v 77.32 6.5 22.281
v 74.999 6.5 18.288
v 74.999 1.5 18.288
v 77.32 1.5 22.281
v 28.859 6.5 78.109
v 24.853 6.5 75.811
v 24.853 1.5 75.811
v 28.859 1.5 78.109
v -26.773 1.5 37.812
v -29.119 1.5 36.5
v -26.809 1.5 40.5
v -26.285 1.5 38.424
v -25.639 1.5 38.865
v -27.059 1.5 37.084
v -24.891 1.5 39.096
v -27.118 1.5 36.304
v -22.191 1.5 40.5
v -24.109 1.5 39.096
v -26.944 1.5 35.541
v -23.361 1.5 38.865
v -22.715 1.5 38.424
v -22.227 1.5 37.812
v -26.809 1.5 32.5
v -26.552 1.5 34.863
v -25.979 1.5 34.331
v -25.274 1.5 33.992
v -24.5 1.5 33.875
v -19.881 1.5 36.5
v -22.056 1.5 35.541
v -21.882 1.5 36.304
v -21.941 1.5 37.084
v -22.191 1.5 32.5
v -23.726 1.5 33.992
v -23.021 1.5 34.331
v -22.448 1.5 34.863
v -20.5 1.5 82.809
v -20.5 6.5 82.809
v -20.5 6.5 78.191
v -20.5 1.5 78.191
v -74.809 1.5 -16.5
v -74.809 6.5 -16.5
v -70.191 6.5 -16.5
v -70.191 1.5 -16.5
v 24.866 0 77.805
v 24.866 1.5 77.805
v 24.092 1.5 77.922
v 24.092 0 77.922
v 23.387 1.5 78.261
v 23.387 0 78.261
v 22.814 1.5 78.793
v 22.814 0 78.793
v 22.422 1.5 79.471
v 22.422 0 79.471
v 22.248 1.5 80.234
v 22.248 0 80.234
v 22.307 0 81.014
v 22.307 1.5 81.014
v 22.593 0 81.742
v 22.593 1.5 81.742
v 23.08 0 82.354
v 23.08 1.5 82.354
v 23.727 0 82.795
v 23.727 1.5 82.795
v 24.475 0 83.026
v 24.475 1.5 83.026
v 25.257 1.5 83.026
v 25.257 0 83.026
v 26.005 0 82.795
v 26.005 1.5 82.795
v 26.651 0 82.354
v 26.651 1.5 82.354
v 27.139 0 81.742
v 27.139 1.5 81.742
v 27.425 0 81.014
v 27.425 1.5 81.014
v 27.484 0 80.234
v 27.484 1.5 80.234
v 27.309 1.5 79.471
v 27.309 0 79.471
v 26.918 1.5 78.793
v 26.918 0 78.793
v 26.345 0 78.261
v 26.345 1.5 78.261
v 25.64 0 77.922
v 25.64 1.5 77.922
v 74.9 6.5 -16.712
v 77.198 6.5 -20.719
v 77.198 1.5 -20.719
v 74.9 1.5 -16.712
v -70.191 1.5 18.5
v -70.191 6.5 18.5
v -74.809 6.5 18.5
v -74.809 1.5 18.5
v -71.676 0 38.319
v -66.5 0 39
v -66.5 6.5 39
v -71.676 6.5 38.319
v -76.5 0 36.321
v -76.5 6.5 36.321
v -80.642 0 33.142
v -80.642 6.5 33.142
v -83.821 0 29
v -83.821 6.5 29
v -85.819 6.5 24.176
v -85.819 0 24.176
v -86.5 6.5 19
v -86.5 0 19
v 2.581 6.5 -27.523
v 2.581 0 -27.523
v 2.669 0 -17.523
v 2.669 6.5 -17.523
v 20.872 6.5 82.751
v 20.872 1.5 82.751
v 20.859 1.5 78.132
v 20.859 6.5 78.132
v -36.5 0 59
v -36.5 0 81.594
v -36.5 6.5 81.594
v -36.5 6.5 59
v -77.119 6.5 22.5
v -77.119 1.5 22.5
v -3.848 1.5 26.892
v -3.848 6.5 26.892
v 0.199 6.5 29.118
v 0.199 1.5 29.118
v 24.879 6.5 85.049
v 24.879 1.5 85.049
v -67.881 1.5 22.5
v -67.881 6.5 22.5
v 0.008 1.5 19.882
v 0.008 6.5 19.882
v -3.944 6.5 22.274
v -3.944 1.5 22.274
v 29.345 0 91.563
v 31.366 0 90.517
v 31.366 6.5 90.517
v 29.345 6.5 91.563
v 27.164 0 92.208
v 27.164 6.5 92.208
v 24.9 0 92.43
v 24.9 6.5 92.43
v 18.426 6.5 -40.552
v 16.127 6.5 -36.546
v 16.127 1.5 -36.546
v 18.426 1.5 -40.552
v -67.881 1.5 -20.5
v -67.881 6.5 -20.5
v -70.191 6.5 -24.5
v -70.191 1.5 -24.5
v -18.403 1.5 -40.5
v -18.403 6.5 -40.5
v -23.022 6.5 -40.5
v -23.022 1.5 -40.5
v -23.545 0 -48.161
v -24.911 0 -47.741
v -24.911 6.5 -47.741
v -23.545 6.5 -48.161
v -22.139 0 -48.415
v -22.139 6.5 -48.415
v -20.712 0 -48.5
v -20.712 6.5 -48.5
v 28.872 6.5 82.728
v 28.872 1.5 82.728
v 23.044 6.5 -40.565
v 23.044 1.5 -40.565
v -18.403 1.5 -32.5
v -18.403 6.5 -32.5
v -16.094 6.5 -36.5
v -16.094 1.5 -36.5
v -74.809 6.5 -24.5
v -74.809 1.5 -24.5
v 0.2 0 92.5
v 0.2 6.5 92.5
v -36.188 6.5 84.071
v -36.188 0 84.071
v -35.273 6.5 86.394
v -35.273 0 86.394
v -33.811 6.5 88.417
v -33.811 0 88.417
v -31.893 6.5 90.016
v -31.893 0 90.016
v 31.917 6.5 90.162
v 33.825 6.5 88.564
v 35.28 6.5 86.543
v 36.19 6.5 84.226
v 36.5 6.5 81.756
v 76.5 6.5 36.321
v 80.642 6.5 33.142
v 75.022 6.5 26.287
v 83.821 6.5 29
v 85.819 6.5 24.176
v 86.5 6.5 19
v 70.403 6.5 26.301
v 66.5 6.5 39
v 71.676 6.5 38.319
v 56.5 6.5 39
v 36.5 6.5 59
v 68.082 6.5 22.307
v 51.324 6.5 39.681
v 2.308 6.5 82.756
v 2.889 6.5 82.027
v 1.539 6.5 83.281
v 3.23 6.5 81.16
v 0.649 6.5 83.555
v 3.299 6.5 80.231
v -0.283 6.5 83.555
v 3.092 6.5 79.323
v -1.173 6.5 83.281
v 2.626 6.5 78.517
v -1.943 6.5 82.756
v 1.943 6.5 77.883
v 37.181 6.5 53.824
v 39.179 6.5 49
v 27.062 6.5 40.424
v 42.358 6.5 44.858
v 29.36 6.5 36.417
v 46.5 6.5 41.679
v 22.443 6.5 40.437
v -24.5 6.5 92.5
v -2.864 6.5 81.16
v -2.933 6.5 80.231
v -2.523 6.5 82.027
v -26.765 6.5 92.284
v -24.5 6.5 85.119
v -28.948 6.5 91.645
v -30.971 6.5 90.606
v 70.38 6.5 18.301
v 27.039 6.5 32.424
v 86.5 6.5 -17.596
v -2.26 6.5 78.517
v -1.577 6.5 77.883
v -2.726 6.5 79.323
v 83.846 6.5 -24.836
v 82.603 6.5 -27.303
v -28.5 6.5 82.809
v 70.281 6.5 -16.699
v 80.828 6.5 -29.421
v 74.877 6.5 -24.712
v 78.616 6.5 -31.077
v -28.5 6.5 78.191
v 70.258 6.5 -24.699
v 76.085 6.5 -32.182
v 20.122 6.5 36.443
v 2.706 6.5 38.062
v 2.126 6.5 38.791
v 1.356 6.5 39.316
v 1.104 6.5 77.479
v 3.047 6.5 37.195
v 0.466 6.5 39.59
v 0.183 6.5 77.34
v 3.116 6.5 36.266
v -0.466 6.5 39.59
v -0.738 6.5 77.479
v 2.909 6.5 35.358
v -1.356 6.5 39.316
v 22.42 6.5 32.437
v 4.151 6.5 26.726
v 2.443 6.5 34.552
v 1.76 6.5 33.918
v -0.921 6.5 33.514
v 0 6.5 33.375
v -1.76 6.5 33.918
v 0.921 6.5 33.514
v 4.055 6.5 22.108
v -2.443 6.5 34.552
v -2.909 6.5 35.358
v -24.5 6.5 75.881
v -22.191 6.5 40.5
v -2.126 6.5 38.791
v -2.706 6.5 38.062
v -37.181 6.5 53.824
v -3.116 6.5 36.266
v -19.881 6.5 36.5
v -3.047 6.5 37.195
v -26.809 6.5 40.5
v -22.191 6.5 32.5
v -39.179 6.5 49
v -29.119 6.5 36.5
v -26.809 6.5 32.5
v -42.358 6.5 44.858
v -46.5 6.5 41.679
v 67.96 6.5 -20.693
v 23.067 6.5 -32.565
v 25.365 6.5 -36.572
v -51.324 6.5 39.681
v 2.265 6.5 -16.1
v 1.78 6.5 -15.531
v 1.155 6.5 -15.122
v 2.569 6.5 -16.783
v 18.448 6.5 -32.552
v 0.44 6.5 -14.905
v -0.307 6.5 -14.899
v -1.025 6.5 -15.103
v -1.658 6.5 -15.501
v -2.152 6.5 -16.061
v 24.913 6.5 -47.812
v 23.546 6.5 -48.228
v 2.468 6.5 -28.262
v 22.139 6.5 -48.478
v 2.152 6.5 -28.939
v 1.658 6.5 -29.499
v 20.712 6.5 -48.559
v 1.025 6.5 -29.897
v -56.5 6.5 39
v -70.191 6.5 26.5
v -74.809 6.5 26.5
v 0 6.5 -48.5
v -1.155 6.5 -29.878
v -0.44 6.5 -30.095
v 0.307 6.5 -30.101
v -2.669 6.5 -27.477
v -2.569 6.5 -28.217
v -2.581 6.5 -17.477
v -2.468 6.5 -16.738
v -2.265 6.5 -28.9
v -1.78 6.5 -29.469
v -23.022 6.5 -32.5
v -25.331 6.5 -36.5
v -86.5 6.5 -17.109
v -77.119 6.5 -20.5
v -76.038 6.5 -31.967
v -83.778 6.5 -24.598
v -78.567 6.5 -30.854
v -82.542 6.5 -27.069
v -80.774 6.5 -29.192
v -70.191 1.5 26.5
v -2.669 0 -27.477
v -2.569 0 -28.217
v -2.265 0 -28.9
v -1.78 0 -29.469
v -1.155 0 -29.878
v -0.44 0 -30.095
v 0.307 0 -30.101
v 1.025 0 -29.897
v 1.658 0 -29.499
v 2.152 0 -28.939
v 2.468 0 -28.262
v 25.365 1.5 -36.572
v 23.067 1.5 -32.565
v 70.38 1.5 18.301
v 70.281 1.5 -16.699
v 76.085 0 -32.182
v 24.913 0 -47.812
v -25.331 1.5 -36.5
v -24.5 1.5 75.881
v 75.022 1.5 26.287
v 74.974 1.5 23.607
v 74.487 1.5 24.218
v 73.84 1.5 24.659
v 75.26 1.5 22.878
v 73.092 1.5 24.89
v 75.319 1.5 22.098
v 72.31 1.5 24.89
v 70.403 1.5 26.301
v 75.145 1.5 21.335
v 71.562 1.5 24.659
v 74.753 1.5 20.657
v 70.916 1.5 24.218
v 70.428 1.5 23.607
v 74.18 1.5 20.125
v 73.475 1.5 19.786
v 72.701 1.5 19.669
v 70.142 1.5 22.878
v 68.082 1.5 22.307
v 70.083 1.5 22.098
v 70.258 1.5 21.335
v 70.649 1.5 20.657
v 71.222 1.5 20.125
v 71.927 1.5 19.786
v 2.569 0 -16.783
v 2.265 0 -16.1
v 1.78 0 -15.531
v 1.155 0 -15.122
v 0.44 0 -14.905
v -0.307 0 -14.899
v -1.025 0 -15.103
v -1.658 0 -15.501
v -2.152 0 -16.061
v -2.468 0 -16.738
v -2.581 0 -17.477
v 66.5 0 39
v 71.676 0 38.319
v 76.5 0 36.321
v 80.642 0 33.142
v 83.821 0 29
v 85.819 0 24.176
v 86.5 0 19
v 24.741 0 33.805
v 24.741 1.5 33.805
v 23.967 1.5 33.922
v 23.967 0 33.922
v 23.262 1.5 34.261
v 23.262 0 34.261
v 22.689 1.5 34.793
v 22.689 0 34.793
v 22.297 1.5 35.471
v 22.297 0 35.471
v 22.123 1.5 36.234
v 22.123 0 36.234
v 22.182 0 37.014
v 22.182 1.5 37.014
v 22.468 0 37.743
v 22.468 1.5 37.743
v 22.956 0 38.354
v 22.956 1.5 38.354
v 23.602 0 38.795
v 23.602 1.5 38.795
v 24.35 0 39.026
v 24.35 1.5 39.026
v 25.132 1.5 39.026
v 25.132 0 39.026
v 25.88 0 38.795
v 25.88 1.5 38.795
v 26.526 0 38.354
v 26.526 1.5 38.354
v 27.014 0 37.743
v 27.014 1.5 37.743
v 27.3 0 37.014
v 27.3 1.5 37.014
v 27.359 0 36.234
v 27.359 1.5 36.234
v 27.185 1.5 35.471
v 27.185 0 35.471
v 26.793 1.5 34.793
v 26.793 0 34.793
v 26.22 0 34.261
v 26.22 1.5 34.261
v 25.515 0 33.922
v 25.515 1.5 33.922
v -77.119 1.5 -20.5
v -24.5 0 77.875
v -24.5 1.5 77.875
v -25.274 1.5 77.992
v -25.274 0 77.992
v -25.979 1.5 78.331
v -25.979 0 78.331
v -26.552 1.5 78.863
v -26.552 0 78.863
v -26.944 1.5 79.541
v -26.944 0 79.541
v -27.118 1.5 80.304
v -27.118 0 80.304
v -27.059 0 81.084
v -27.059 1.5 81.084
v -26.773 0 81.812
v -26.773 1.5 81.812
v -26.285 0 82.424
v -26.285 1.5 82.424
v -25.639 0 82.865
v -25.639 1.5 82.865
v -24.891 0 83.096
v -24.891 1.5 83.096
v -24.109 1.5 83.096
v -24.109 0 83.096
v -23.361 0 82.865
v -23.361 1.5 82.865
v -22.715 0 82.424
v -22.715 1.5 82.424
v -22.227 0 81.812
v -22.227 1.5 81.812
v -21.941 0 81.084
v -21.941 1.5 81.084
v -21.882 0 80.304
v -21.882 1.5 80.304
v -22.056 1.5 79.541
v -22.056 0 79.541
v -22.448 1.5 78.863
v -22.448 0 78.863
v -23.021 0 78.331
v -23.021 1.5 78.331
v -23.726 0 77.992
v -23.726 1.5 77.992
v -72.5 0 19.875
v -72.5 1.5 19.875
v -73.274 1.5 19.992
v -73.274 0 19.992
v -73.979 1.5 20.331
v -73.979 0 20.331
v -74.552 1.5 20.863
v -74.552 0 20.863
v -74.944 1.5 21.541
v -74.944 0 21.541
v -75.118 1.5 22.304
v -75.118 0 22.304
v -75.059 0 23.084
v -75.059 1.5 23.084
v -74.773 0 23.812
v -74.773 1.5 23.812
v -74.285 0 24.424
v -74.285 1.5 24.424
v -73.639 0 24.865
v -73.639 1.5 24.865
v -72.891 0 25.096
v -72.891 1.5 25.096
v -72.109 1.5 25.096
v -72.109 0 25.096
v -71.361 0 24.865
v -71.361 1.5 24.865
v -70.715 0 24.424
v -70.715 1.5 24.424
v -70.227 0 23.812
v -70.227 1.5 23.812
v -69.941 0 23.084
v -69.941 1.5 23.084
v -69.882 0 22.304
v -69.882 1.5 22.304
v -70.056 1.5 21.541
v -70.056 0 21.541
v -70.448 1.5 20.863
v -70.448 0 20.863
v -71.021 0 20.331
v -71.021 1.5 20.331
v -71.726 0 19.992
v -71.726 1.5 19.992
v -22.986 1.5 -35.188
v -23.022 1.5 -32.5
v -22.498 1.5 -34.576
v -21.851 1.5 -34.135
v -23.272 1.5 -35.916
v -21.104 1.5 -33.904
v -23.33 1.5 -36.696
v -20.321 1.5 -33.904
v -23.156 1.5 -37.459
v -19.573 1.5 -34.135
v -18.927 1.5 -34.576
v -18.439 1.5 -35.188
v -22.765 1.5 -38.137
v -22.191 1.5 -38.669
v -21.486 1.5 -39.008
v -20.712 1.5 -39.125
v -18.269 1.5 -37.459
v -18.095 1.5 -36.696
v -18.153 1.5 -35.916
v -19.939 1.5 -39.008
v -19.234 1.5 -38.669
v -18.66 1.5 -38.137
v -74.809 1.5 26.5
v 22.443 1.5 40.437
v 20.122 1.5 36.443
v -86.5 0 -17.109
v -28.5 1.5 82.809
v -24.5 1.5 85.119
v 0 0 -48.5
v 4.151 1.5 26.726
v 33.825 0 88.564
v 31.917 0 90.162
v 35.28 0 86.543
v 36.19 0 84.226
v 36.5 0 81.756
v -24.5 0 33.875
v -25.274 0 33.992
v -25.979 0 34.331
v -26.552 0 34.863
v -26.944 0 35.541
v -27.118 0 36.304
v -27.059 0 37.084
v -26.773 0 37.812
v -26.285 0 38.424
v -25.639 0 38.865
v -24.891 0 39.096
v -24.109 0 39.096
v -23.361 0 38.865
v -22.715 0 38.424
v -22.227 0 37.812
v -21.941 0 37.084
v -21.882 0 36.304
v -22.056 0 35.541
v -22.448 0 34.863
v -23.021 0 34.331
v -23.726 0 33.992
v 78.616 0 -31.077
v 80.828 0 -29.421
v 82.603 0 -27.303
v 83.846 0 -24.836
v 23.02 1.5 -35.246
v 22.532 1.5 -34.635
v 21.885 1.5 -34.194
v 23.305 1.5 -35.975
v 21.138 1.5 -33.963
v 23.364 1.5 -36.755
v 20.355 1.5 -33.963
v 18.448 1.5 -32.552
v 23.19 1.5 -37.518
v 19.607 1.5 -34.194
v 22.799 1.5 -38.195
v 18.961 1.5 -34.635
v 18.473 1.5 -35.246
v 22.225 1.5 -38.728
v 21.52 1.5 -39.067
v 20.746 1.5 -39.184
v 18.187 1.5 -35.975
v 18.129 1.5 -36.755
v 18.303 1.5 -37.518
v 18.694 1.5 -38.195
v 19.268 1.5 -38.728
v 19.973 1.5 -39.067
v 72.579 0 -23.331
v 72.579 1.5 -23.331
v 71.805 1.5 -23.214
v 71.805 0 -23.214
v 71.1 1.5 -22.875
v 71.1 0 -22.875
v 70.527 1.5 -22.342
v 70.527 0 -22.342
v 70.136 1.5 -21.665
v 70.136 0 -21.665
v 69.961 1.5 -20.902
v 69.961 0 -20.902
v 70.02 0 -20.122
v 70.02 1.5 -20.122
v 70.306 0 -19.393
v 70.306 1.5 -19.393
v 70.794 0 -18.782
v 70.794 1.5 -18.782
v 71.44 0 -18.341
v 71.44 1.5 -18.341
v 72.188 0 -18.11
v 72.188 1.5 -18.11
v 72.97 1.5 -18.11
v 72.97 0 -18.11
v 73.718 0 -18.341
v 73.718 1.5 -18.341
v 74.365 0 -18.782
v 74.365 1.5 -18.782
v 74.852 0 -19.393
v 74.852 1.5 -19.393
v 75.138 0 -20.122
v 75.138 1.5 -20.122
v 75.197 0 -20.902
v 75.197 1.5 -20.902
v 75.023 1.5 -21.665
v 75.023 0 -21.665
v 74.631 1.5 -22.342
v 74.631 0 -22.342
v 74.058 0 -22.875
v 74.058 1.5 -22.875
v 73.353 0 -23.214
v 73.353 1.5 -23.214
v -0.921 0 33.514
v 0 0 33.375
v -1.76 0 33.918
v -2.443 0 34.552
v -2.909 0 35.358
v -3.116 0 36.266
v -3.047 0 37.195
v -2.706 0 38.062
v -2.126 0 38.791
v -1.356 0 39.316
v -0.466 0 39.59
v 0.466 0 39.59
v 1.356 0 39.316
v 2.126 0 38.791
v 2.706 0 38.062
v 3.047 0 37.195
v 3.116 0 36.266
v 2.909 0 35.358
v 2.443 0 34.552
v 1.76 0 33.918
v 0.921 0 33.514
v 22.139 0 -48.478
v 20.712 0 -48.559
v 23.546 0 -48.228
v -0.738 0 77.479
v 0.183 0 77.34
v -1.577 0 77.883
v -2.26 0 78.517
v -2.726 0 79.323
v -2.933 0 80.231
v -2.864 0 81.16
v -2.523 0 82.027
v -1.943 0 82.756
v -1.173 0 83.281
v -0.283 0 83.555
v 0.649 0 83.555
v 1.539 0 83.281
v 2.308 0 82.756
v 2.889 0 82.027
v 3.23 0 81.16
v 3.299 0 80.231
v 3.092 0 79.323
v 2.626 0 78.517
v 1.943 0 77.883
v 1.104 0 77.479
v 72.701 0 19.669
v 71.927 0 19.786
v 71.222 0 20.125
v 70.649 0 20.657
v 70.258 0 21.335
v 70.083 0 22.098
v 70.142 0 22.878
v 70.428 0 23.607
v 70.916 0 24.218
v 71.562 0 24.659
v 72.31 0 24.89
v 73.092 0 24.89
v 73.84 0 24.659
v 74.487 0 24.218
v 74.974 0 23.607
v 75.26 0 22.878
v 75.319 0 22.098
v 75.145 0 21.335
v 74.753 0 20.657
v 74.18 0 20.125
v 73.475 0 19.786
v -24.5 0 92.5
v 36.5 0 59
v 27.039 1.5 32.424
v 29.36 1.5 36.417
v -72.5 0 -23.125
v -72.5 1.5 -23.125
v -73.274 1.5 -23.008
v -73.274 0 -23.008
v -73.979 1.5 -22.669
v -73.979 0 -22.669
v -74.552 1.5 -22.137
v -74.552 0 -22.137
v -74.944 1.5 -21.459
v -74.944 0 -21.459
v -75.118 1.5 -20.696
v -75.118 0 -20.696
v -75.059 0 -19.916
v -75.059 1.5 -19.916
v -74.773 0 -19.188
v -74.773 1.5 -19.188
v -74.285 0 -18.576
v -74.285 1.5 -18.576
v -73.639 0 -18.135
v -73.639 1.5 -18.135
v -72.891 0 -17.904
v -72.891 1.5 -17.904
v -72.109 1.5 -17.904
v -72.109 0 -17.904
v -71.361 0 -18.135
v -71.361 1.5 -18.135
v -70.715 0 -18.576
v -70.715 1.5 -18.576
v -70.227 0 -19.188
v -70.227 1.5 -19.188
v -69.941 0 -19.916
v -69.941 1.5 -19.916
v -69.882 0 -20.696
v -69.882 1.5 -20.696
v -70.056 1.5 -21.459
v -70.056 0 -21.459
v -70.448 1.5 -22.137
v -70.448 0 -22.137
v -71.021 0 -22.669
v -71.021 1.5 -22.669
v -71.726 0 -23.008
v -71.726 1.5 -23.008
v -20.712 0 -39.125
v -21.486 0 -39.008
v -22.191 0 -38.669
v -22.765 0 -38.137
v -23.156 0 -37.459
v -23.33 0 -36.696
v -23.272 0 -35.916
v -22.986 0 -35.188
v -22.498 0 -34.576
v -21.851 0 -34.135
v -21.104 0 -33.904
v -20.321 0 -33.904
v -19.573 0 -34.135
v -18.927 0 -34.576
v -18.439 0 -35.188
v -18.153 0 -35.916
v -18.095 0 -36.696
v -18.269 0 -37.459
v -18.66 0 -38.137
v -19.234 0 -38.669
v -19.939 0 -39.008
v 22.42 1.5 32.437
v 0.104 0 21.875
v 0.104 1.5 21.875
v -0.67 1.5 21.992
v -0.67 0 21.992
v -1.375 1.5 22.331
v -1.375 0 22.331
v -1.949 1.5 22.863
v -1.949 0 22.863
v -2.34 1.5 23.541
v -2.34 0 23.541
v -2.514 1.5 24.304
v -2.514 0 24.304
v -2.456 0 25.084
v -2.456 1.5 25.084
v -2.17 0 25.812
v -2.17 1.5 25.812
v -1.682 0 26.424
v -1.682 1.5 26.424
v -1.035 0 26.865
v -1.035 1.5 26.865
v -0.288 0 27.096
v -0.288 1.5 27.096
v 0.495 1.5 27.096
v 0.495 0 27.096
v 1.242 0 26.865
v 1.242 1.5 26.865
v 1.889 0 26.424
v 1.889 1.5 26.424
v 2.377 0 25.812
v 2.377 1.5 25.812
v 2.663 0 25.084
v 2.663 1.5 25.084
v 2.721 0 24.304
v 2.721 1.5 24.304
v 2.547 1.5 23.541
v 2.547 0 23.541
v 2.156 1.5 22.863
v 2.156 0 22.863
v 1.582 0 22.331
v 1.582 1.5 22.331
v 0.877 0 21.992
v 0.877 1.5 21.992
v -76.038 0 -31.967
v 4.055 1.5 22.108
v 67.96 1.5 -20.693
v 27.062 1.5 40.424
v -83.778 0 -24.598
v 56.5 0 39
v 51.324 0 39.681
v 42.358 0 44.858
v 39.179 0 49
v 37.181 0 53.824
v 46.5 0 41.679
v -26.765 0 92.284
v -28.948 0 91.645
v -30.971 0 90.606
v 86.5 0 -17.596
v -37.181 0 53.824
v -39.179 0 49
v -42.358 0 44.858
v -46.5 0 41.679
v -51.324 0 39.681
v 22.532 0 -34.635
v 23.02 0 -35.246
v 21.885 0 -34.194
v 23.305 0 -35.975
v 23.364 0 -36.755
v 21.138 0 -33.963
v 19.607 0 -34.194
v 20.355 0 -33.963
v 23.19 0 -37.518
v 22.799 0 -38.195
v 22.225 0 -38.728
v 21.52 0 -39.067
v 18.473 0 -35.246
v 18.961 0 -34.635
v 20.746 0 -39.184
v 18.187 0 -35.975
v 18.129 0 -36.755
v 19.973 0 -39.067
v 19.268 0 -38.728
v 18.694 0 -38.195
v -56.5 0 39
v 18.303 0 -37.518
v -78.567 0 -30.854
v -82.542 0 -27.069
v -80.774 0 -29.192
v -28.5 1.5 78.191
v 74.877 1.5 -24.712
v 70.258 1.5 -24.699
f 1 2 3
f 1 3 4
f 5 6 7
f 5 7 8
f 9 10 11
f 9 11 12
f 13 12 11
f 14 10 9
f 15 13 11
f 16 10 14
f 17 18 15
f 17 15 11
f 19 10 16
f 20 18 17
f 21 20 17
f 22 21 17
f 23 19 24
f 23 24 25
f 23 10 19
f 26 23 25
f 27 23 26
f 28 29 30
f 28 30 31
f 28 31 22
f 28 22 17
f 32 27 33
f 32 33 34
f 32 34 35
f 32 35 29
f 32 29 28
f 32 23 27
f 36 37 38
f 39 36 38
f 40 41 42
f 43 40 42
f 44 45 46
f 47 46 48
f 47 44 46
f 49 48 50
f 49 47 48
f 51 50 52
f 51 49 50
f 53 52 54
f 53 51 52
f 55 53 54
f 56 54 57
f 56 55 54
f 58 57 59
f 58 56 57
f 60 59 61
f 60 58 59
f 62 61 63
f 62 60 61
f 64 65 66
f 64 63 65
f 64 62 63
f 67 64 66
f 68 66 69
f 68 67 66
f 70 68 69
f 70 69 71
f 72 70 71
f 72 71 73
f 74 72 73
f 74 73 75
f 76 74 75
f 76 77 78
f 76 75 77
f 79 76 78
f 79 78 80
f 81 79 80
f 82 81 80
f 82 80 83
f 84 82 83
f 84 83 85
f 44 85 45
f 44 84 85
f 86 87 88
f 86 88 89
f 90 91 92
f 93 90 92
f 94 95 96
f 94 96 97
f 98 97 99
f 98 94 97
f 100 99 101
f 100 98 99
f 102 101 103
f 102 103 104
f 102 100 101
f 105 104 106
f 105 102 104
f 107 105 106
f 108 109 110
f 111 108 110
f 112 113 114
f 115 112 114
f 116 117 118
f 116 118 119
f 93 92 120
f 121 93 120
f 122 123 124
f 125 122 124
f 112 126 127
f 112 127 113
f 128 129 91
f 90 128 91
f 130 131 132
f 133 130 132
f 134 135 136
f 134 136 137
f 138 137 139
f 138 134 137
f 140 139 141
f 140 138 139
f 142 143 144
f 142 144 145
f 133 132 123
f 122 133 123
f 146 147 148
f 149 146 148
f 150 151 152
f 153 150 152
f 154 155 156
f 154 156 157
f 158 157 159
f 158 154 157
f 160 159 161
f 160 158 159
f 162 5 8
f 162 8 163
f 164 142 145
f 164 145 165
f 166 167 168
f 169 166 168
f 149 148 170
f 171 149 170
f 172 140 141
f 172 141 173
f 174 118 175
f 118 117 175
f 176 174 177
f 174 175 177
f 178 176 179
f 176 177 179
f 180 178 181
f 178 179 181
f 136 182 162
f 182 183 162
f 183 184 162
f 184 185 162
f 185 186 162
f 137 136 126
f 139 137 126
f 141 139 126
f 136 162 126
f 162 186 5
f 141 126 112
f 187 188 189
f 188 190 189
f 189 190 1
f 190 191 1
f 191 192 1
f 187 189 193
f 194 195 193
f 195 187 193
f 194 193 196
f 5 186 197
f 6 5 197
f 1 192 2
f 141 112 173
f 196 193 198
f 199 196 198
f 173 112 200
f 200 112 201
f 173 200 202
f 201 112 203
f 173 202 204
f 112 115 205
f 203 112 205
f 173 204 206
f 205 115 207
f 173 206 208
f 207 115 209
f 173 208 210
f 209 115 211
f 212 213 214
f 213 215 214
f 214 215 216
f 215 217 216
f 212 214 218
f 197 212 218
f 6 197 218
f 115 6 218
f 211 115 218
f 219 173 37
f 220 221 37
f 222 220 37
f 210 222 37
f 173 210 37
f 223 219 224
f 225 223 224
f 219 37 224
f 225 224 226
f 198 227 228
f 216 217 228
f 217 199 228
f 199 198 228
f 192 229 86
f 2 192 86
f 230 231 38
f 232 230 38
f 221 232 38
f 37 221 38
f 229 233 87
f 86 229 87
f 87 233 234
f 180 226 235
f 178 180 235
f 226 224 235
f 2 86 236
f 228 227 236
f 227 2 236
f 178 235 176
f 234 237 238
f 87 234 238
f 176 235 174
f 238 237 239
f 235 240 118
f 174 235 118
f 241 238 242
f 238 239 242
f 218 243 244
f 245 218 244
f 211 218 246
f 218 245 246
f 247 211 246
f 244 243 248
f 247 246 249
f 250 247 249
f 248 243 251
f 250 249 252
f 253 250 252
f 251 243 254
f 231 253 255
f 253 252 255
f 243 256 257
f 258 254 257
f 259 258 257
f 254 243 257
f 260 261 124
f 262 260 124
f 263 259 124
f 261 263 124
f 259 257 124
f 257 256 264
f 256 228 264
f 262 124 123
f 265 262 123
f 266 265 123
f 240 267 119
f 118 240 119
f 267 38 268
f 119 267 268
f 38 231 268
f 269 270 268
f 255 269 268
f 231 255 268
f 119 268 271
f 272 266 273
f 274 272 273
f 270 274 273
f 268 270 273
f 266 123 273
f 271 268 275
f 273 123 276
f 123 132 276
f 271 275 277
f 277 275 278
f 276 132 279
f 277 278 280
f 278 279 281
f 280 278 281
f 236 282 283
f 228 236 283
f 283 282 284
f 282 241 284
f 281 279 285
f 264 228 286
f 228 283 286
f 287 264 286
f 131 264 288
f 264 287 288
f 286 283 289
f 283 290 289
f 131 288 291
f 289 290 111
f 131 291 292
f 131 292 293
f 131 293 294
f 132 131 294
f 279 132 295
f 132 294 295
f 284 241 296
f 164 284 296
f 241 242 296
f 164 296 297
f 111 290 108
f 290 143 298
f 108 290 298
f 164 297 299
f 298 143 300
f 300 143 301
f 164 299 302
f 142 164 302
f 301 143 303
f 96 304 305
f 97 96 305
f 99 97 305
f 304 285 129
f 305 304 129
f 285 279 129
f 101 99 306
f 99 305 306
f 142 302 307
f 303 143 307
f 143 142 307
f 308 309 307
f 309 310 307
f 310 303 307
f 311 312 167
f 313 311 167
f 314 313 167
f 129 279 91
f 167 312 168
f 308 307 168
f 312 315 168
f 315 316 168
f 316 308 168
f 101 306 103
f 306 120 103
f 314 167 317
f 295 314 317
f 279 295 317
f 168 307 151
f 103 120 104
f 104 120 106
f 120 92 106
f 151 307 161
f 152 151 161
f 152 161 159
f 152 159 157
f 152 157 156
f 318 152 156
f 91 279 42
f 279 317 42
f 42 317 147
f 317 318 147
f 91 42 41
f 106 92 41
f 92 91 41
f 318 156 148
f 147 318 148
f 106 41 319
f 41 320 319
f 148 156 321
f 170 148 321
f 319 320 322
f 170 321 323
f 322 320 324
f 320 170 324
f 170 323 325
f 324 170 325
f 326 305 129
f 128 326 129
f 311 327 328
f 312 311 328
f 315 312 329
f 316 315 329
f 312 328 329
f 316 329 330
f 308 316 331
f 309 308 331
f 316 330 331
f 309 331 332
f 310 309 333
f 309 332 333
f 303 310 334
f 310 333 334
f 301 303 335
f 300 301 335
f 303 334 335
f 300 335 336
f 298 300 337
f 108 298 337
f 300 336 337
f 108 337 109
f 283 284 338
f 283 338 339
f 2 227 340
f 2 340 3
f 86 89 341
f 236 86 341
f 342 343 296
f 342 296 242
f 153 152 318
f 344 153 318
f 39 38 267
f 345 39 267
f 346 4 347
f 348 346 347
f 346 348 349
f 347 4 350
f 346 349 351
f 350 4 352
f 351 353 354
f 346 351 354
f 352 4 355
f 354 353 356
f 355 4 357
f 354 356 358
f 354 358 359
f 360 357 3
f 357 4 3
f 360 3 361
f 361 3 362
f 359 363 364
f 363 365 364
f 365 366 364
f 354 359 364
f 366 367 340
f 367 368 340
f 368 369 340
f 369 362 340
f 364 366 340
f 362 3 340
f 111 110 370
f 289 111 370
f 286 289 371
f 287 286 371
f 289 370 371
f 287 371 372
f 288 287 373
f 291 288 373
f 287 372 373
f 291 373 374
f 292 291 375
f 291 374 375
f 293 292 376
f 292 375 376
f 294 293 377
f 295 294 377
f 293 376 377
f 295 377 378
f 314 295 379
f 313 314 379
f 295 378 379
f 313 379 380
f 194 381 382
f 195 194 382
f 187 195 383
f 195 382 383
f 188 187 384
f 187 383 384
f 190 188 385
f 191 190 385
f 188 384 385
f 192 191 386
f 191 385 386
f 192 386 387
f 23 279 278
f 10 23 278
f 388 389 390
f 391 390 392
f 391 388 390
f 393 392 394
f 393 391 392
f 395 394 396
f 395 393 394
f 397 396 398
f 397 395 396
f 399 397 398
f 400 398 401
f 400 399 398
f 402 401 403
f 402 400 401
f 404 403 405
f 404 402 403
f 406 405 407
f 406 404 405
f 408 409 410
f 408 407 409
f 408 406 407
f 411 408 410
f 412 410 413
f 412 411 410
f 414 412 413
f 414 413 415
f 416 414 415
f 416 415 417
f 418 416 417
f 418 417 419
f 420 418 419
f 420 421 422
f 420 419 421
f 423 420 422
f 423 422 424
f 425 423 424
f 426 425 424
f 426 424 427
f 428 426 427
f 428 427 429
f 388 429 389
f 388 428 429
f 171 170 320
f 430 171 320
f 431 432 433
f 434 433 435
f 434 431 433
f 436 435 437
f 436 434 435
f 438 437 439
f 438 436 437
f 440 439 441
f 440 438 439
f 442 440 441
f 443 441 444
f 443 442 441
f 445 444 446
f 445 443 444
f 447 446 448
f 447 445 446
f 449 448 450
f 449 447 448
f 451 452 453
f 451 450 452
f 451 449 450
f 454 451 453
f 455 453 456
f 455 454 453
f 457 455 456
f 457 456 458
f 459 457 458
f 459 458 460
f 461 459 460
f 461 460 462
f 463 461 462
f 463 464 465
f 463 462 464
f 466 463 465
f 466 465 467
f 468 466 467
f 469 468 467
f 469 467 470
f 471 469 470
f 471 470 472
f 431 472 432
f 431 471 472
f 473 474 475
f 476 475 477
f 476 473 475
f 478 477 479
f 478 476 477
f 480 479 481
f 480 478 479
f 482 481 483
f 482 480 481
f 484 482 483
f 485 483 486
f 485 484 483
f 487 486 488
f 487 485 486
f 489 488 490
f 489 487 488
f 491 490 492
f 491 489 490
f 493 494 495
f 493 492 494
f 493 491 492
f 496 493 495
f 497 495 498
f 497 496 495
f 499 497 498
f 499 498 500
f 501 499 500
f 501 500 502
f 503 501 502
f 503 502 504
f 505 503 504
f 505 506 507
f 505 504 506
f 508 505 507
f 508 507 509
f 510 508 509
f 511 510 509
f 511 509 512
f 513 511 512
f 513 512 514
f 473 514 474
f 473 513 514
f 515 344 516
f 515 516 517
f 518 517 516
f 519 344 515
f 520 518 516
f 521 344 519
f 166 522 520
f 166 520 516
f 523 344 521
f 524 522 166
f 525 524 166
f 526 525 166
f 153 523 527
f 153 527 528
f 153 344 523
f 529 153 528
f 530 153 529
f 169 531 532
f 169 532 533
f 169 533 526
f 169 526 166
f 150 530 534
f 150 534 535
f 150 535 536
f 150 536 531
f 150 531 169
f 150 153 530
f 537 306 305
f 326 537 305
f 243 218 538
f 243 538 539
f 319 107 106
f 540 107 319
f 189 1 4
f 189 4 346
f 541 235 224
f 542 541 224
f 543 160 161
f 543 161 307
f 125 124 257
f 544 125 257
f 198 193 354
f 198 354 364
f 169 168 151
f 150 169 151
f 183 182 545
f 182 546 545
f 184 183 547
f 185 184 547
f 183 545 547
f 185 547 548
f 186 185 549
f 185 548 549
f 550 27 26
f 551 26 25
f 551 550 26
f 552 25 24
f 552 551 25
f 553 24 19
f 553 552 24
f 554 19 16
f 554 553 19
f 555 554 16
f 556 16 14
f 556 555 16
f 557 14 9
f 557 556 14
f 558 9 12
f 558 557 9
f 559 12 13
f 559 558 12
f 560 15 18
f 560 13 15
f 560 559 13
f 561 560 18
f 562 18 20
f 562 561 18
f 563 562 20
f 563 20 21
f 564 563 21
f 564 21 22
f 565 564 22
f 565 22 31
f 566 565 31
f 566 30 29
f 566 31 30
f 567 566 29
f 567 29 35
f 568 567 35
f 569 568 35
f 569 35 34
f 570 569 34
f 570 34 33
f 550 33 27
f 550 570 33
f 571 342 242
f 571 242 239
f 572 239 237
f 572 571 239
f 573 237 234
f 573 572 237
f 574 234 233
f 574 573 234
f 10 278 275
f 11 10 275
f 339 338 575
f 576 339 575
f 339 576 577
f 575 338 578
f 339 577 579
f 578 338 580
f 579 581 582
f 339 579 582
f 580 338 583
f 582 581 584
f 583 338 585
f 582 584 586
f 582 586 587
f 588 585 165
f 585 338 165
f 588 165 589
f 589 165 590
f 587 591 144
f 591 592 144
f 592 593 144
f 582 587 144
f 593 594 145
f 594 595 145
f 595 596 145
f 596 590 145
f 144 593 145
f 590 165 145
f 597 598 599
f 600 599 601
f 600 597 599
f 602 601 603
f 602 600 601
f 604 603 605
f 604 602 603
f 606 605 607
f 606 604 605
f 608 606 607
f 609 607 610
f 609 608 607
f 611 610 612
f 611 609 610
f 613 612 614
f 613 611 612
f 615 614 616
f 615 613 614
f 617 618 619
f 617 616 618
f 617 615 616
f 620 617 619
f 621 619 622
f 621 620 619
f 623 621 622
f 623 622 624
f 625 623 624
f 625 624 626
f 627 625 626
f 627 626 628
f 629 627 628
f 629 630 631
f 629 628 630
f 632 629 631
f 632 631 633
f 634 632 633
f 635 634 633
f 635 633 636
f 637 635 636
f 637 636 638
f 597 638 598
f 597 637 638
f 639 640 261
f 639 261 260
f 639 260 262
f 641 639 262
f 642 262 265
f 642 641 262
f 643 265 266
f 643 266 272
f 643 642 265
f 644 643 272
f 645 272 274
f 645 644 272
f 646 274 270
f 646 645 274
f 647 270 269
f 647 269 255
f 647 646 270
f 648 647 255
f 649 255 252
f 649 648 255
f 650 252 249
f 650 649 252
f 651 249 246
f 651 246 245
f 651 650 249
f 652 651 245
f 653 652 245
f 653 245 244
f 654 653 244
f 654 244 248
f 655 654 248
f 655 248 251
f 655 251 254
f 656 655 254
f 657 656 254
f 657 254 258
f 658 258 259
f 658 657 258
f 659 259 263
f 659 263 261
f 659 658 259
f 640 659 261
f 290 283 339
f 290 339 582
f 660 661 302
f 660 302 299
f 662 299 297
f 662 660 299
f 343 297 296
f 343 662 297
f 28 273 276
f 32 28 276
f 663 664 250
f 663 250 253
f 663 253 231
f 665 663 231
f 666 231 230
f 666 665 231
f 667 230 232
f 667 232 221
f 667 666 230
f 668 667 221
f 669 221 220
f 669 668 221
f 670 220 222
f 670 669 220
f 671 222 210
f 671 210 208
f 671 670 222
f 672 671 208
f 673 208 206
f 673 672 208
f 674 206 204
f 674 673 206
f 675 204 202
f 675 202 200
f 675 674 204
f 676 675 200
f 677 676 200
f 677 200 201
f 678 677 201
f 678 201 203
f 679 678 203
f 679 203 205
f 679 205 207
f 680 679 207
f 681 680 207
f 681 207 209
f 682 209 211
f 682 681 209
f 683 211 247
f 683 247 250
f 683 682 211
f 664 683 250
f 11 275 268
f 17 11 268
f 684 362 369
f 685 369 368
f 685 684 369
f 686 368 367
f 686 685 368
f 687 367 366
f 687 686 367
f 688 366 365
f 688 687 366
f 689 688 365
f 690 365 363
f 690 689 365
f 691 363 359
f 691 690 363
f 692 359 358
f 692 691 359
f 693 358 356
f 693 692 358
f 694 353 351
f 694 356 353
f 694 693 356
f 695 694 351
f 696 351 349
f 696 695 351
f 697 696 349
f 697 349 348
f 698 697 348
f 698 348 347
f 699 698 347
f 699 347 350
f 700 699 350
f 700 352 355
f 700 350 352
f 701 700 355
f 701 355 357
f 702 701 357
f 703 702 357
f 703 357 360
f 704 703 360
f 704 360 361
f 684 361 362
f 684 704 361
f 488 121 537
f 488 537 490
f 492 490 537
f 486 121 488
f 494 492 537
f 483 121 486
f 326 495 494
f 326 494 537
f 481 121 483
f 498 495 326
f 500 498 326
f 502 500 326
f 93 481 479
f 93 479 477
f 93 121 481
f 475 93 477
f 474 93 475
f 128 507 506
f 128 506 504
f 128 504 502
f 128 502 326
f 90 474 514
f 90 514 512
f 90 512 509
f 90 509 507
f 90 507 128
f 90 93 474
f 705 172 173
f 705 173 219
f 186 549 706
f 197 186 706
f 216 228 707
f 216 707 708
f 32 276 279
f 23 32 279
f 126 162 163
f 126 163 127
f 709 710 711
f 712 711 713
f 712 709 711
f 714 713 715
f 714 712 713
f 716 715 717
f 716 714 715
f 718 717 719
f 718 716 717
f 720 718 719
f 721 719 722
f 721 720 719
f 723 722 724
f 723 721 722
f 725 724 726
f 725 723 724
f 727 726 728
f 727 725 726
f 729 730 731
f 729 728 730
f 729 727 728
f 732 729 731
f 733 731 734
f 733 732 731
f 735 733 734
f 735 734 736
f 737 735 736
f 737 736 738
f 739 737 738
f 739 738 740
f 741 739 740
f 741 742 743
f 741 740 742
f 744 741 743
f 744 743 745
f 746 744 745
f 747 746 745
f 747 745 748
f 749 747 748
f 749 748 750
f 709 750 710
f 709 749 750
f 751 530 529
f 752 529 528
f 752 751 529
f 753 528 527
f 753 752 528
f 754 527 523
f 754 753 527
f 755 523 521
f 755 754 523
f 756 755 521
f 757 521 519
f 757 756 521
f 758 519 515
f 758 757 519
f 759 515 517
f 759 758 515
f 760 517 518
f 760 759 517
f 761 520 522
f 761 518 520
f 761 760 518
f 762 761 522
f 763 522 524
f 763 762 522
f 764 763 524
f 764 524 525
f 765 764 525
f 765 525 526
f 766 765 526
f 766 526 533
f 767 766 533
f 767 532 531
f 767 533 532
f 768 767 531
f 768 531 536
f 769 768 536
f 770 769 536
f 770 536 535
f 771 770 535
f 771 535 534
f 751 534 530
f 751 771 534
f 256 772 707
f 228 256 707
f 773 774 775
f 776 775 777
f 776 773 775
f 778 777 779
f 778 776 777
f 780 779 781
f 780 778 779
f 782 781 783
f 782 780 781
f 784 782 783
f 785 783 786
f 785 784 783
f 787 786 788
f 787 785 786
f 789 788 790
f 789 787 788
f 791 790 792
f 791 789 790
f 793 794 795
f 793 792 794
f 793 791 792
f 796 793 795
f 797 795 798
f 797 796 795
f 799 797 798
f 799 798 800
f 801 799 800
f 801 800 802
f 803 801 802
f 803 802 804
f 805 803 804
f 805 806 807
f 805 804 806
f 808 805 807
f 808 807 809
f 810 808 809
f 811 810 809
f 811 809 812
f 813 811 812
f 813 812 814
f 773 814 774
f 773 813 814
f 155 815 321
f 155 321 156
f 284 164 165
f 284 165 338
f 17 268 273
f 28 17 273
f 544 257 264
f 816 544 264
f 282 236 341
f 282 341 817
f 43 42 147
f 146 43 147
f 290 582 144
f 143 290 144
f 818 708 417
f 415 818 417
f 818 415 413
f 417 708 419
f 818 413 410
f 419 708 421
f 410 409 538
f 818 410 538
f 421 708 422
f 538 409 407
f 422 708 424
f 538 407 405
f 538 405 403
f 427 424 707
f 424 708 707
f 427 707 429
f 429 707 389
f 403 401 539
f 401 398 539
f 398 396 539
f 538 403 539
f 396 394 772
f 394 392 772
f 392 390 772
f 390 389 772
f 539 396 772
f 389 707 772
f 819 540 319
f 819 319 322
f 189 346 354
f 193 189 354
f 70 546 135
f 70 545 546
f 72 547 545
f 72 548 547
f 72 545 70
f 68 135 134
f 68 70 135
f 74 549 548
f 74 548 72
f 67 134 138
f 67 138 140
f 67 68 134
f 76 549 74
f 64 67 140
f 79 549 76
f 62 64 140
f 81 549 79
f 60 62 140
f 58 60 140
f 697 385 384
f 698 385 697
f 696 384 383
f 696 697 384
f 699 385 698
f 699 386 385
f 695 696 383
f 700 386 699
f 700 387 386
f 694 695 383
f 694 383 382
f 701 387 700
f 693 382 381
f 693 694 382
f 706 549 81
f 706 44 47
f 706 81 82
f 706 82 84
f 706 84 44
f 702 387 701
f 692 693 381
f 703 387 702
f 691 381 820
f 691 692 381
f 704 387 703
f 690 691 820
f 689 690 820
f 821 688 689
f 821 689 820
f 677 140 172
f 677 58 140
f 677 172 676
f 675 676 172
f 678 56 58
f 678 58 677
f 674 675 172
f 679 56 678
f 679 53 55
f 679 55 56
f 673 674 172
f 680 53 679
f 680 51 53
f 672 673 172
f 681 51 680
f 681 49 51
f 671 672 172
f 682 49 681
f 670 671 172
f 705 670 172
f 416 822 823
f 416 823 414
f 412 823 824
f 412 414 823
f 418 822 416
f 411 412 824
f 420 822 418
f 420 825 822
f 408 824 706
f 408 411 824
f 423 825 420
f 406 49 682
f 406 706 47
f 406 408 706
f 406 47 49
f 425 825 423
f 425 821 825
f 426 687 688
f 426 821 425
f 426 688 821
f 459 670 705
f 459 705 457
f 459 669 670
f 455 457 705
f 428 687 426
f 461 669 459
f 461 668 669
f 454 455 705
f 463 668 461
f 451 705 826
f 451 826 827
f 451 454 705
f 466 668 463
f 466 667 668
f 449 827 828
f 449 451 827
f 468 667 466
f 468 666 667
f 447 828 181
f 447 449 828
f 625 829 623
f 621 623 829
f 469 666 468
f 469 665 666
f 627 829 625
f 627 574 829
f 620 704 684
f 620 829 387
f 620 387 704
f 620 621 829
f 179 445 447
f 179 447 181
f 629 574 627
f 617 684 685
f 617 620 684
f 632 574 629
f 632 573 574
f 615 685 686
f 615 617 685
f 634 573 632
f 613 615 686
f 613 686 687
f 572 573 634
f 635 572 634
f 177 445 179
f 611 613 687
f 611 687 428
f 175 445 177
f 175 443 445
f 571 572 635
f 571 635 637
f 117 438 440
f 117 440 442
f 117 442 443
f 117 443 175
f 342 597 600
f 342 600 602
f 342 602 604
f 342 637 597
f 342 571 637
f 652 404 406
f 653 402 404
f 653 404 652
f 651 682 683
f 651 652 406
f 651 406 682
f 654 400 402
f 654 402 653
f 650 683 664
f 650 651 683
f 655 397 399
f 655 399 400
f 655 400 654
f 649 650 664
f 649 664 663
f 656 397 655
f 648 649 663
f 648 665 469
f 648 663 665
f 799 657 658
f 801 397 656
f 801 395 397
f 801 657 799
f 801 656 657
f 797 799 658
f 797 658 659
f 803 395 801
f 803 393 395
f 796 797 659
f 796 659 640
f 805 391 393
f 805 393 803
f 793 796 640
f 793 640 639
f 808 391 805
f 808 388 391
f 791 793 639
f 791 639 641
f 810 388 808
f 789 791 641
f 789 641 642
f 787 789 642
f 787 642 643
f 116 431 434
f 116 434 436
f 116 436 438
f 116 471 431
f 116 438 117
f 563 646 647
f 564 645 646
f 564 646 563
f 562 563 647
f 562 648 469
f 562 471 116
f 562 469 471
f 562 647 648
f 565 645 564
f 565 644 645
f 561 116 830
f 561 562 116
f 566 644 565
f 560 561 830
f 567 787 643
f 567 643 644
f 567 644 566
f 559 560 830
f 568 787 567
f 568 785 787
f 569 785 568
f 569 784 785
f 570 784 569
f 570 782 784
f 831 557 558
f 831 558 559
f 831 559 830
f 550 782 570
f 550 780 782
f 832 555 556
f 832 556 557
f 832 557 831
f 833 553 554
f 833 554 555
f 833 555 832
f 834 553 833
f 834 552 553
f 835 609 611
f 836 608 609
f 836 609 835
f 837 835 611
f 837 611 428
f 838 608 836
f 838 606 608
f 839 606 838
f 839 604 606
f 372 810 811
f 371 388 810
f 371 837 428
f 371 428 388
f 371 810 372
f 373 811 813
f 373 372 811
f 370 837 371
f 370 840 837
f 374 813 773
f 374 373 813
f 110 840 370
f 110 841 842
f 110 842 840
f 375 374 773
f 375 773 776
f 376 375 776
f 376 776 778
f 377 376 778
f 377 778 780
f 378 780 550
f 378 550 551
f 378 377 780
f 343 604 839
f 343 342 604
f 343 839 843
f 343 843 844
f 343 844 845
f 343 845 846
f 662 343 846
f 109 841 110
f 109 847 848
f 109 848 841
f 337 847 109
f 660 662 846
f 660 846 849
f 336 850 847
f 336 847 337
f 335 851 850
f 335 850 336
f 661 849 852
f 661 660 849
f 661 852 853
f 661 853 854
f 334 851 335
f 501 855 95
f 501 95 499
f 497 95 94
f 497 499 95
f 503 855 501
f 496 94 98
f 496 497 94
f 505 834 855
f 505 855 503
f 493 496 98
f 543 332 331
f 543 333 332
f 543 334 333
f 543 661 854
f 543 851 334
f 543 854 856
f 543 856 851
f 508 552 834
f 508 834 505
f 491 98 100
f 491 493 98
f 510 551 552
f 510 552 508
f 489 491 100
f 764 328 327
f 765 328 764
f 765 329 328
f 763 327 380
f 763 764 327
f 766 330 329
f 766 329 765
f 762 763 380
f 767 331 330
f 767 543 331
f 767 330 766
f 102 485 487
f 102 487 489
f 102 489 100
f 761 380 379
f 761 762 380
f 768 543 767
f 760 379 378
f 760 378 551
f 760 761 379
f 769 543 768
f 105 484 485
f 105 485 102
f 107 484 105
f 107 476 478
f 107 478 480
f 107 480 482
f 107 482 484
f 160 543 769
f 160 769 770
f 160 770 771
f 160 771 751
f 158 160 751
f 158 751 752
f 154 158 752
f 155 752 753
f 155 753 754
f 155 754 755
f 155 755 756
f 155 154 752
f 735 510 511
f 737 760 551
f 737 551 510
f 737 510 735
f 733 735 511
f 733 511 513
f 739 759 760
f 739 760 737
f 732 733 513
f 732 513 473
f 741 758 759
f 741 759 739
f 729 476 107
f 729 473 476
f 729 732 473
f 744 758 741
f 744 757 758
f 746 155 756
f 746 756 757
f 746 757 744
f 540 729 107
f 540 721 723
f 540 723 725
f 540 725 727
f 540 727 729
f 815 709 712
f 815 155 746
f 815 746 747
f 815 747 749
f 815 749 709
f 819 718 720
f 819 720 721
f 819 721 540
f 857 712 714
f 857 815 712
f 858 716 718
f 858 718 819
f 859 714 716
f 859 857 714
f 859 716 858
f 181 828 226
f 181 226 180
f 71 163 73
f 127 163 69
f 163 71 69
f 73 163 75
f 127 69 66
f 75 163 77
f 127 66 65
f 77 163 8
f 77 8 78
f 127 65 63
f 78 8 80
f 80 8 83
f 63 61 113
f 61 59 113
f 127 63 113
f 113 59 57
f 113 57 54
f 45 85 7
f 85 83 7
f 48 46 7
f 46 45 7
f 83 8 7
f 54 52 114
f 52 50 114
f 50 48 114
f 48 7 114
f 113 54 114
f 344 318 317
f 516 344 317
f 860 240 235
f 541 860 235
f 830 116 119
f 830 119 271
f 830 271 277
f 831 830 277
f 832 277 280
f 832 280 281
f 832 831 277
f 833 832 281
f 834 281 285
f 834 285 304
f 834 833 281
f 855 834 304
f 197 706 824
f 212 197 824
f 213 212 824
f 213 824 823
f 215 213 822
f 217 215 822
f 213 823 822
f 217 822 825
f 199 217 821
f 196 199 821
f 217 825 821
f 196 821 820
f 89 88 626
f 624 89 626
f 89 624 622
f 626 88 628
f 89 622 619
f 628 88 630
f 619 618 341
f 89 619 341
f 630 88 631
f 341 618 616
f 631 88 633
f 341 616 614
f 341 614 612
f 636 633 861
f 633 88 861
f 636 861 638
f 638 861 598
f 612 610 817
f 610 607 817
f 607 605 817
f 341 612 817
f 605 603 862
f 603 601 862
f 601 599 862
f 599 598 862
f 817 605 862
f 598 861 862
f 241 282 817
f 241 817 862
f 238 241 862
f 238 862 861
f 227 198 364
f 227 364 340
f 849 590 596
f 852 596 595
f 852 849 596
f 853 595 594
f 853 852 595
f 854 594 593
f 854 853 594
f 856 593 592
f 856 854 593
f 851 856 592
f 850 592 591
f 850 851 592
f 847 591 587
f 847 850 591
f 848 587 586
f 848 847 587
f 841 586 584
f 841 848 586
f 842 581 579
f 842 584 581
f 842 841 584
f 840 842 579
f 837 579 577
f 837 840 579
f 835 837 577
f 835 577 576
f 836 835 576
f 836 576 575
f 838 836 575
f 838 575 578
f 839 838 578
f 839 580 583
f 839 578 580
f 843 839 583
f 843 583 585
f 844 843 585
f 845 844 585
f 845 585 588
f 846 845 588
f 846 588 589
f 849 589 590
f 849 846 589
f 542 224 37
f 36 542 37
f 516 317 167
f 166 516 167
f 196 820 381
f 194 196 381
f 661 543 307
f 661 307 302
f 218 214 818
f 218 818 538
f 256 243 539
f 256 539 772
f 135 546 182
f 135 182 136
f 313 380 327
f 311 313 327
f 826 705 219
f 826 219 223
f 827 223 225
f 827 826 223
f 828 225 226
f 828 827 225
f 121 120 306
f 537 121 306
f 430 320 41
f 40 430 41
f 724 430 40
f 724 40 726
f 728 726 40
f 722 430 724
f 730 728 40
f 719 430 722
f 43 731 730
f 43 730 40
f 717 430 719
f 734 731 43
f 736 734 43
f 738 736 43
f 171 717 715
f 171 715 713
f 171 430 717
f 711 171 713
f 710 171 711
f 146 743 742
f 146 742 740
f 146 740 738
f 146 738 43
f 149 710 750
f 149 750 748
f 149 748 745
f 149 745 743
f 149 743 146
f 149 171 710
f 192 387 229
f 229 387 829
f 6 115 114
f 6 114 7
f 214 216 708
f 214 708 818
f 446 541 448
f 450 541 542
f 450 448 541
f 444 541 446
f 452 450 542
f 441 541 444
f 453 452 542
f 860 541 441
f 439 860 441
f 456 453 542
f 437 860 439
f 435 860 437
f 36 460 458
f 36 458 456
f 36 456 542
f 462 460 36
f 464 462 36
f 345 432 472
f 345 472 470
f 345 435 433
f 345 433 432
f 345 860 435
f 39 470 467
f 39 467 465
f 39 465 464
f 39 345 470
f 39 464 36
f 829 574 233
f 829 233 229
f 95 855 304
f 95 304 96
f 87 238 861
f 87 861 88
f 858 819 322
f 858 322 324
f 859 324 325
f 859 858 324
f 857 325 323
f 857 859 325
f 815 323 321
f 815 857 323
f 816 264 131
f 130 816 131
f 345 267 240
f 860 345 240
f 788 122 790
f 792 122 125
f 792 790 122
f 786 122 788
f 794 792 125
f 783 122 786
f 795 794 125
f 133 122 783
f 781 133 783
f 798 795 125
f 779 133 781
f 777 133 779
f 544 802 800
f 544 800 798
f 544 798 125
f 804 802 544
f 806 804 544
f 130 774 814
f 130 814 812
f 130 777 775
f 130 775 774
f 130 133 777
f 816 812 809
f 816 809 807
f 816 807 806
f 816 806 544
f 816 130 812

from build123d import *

# Parameters (mm, degrees)
SKETCH2_R          = 2.625
SKETCH2_R_2        = 3.125
MAINPLATE_DEPTH    = 6.5
PRESSFITNUTS_DEPTH = 5
CUT_EXTRUDE2_DEPTH = 6.5
FILLET2_R          = 10


with BuildPart() as part:
    # Sketch2 → MainPlate (new body)
    with BuildSketch(Plane(origin=(0, 0, 0), x_dir=(1, 0, 0), z_dir=(0, 1, 0))):
        with BuildLine():
            Line((24.899900609, -92.429929219), (0.2, -92.5))
            Line((0.2, -92.5), (-24.5, -92.5))
            ThreePointArc((-24.5, -92.5), (-27.871368271, -92.016678166), (-30.971160559, -90.605645997))
            Line((-30.971160559, -90.605645997), (-99.683475736, -46.605645997))
            ThreePointArc((-99.683475736, -46.605645997), (-104.578950448, -40.347025165), (-104.490786491, -32.401697323))
            Line((-104.490786491, -32.401697323), (-83.778471314, 24.598302677))
            ThreePointArc((-83.778471314, 24.598302677), (-80.773721892, 29.191692934), (-76.037940173, 31.966602781))
            Line((-76.037940173, 31.966602781), (-24.911380811, 47.741345462))
            ThreePointArc((-24.911380811, 47.741345462), (-22.845839779, 48.308813352), (-20.712315177, 48.5))
            Line((-20.712315177, 48.5), (0, 48.5))
            Line((0, 48.5), (20.712231832, 48.558758223))
            ThreePointArc((20.712231832, 48.558758223), (22.846290221, 48.373624884), (24.913432777, 47.812018957))
            Line((24.913432777, 47.812018957), (76.084537362, 32.182379345))
            ThreePointArc((76.084537362, 32.182379345), (80.828172093, 29.420915478), (83.845940292, 24.836067799))
            Line((83.845940292, 24.836067799), (104.719873926, -32.104944614))
            ThreePointArc((104.719873926, -32.104944614), (104.830577421, -40.049990373), (99.952877324, -46.322473865))
            Line((99.952877324, -46.322473865), (31.365661085, -90.517224974))
            ThreePointArc((31.365661085, -90.517224974), (28.26988419, -91.937045184), (24.899900609, -92.429929219))
        make_face()
        with Locations(Location((-72.5, 20.5, 0), (0, 0, 90))):
            Circle(SKETCH2_R, mode=Mode.SUBTRACT)
        with Locations(Location((-20.712315177, 36.5, 0), (0, 0, 90))):
            Circle(SKETCH2_R, mode=Mode.SUBTRACT)
        with Locations(Location((-93.212315177, -36.5, 0), (0, 0, 90))):
            Circle(SKETCH2_R, mode=Mode.SUBTRACT)
        with Locations(Location((-58.856157589, -58.5, 0), (0, 0, 90))):
            Circle(SKETCH2_R, mode=Mode.SUBTRACT)
        with Locations(Location((-24.5, -80.5, 0), (0, 0, 90))):
            Circle(SKETCH2_R, mode=Mode.SUBTRACT)
        with Locations(Location((-24.5, -36.5, 0), (0, 0, 90))):
            Circle(SKETCH2_R, mode=Mode.SUBTRACT)
        with Locations(Location((-72.5, -22.5, 0), (0, 0, 90))):
            Circle(SKETCH2_R, mode=Mode.SUBTRACT)
        with Locations(Location((24.74103568, -36.430154559, 0), (0, 0, 90))):
            Circle(SKETCH2_R, mode=Mode.SUBTRACT)
        with Locations(Location((24.865858124, -80.429977506, 0), (0, 0, 90))):
            Circle(SKETCH2_R, mode=Mode.SUBTRACT)
        with Locations(Location((59.159466244, -58.332601952, 0), (0, 0, 90))):
            Circle(SKETCH2_R, mode=Mode.SUBTRACT)
        with Locations(Location((93.453074364, -36.235226398, 0), (0, 0, 90))):
            Circle(SKETCH2_R, mode=Mode.SUBTRACT)
        with Locations(Location((72.701126299, -22.294040956, 0), (0, 0, 90))):
            Circle(SKETCH2_R, mode=Mode.SUBTRACT)
        with Locations(Location((72.579140729, 20.705786015, 0), (0, 0, 90))):
            Circle(SKETCH2_R, mode=Mode.SUBTRACT)
        with Locations(Location((20.746274317, 36.55880651, 0), (0, 0, 90))):
            Circle(SKETCH2_R, mode=Mode.SUBTRACT)
        with Locations(Location((0, -36.5, 0), (0, 0, 90))):
            Circle(SKETCH2_R_2, mode=Mode.SUBTRACT)
        with Locations(Location((0.182929062, -80.464988753, 0), (0, 0, 90))):
            Circle(SKETCH2_R_2, mode=Mode.SUBTRACT)
        with Locations(Location((0.103546099, -24.5, 0), (0, 0, 90))):
            Circle(SKETCH2_R, mode=Mode.SUBTRACT)
        with BuildLine():
            Line((2.580926866, 27.523084214), (2.668870128, 17.523084214))
            ThreePointArc((2.668870128, 17.523084214), (0.067055845, 14.875101503), (-2.580926866, 17.476915786))
            Line((-2.580926866, 17.476915786), (-2.668870128, 27.476915786))
            ThreePointArc((-2.668870128, 27.476915786), (-0.067055845, 30.124898497), (2.580926866, 27.523084214))
        make_face(mode=Mode.SUBTRACT)
    extrude(amount=MAINPLATE_DEPTH)

    # Sketch8 → PressFitNuts (cut)
    with BuildSketch(Plane(origin=(0, 6.5, 0), x_dir=(1, 0, 0), z_dir=(0, 1, 0))):
        Polygon((-3.847658971, -26.891926384), (0.199412577, -29.117807158), (4.150617647, -26.725880774), (4.054751169, -22.108073616), (0.007679621, -19.882192842), (-3.943525449, -22.274119226), align=None)
        Polygon((-19.881197846, -36.5), (-22.190598923, -32.5), (-26.809401077, -32.5), (-29.118802154, -36.5), (-26.809401077, -40.5), (-22.190598923, -40.5), align=None)
        Polygon((-67.881197846, -22.5), (-70.190598923, -18.5), (-74.809401077, -18.5), (-77.118802154, -22.5), (-74.809401077, -26.5), (-70.190598923, -26.5), align=None)
        Polygon((-67.881197846, 20.5), (-70.190598923, 24.5), (-74.809401077, 24.5), (-77.118802154, 20.5), (-74.809401077, 16.5), (-70.190598923, 16.5), align=None)
        Polygon((-88.593513024, -36.5), (-90.9029141, -32.5), (-95.521716254, -32.5), (-97.831117331, -36.5), (-95.521716254, -40.5), (-90.9029141, -40.5), align=None)
        Polygon((-54.237355435, -58.5), (-56.546756512, -54.5), (-61.165558665, -54.5), (-63.474959742, -58.5), (-61.165558665, -62.5), (-56.546756512, -62.5), align=None)
        Polygon((-24.5, -75.881197846), (-28.5, -78.190598923), (-28.5, -82.809401077), (-24.5, -85.118802154), (-20.5, -82.809401077), (-20.5, -78.190598923), align=None)
        Polygon((-16.093513024, 36.5), (-18.4029141, 40.5), (-23.021716254, 40.5), (-25.331117331, 36.5), (-23.021716254, 32.5), (-18.4029141, 32.5), align=None)
        Polygon((18.448230028, 32.552271126), (16.127490749, 36.545703551), (18.425535038, 40.552238935), (23.044318606, 40.565341893), (25.365057885, 36.571909468), (23.067013596, 32.565374085), align=None)
        Polygon((20.859322741, -78.131933217), (24.852755166, -75.811193938), (28.859290549, -78.109238227), (28.872393508, -82.728021795), (24.878961083, -85.048761074), (20.872425699, -82.750716785), align=None)
        Polygon((56.861421955, -62.339137336), (54.540682676, -58.34570491), (56.838726965, -54.339169527), (61.457510533, -54.326066569), (63.778249812, -58.319498994), (61.480205523, -62.326034377), align=None)
        Polygon((91.155030075, -40.241761781), (88.834290796, -36.248329356), (91.132335085, -32.241793973), (95.751118653, -32.228691014), (98.071857931, -36.222123439), (95.773813642, -40.228658823), align=None)
        Polygon((70.28109644, 16.699250632), (67.960357161, 20.692683057), (70.25840145, 24.69921844), (74.877185018, 24.712321399), (77.197924297, 20.718888974), (74.899880008, 16.71235359), align=None)
        Polygon((70.40308201, -26.300576339), (68.082342731, -22.307143914), (70.38038702, -18.300608531), (74.999170588, -18.287505572), (77.319909867, -22.280937997), (75.021865578, -26.287473381), align=None)
        Polygon((22.442991391, -40.436689943), (20.122252112, -36.443257518), (22.420296401, -32.436722134), (27.039079969, -32.423619176), (29.359819248, -36.417051601), (27.061774959, -40.423586984), align=None)
    extrude(amount=-PRESSFITNUTS_DEPTH, mode=Mode.SUBTRACT)

    # Sketch11 → Cut-Extrude2 (cut)
    with BuildSketch(Plane(origin=(0, 0, 0), x_dir=(1, 0, 0), z_dir=(0, 1, 0))):
        with BuildLine():
            Line((-111.9, 4.5), (-111.9, -116.15))
            Line((-111.9, -116.15), (-86.5, -116.15))
            Line((-86.5, -116.15), (-36.5, -116.15))
            Line((-36.5, -116.15), (-36.5, -59))
            ThreePointArc((-36.5, -59), (-42.357864376, -44.857864376), (-56.5, -39))
            Line((-56.5, -39), (-66.5, -39))
            ThreePointArc((-66.5, -39), (-80.642135624, -33.142135624), (-86.5, -19))
            Line((-86.5, -19), (-86.5, 4.5))
            Line((-86.5, 4.5), (-86.5, 44.576396133))
            Line((-86.5, 44.576396133), (-111.9, 44.576396133))
            Line((-111.9, 44.576396133), (-111.9, 4.5))
        make_face()
        with BuildLine():
            Line((86.5, 4.5), (86.5, 44.576396133))
            Line((86.5, 44.576396133), (111.9, 44.576396133))
            Line((111.9, 44.576396133), (111.9, 4.5))
            Line((111.9, 4.5), (111.9, -116.15))
            Line((111.9, -116.15), (86.5, -116.15))
            Line((86.5, -116.15), (36.5, -116.15))
            Line((36.5, -116.15), (36.5, -59))
            ThreePointArc((36.5, -59), (42.357864376, -44.857864376), (56.5, -39))
            Line((56.5, -39), (66.5, -39))
            ThreePointArc((66.5, -39), (80.642135624, -33.142135624), (86.5, -19))
            Line((86.5, -19), (86.5, 4.5))
        make_face()
    extrude(amount=CUT_EXTRUDE2_DEPTH, mode=Mode.SUBTRACT)

    # Fillet2
    fillet2_edges = [part.edges().sort_by_distance(p)[0] for p in [
        (36.5, 3.25, 87.208870401),
        (-36.5, 3.25, 87.065248111),
    ]]
    fillet(fillet2_edges, radius=FILLET2_R)


solid = part.part
